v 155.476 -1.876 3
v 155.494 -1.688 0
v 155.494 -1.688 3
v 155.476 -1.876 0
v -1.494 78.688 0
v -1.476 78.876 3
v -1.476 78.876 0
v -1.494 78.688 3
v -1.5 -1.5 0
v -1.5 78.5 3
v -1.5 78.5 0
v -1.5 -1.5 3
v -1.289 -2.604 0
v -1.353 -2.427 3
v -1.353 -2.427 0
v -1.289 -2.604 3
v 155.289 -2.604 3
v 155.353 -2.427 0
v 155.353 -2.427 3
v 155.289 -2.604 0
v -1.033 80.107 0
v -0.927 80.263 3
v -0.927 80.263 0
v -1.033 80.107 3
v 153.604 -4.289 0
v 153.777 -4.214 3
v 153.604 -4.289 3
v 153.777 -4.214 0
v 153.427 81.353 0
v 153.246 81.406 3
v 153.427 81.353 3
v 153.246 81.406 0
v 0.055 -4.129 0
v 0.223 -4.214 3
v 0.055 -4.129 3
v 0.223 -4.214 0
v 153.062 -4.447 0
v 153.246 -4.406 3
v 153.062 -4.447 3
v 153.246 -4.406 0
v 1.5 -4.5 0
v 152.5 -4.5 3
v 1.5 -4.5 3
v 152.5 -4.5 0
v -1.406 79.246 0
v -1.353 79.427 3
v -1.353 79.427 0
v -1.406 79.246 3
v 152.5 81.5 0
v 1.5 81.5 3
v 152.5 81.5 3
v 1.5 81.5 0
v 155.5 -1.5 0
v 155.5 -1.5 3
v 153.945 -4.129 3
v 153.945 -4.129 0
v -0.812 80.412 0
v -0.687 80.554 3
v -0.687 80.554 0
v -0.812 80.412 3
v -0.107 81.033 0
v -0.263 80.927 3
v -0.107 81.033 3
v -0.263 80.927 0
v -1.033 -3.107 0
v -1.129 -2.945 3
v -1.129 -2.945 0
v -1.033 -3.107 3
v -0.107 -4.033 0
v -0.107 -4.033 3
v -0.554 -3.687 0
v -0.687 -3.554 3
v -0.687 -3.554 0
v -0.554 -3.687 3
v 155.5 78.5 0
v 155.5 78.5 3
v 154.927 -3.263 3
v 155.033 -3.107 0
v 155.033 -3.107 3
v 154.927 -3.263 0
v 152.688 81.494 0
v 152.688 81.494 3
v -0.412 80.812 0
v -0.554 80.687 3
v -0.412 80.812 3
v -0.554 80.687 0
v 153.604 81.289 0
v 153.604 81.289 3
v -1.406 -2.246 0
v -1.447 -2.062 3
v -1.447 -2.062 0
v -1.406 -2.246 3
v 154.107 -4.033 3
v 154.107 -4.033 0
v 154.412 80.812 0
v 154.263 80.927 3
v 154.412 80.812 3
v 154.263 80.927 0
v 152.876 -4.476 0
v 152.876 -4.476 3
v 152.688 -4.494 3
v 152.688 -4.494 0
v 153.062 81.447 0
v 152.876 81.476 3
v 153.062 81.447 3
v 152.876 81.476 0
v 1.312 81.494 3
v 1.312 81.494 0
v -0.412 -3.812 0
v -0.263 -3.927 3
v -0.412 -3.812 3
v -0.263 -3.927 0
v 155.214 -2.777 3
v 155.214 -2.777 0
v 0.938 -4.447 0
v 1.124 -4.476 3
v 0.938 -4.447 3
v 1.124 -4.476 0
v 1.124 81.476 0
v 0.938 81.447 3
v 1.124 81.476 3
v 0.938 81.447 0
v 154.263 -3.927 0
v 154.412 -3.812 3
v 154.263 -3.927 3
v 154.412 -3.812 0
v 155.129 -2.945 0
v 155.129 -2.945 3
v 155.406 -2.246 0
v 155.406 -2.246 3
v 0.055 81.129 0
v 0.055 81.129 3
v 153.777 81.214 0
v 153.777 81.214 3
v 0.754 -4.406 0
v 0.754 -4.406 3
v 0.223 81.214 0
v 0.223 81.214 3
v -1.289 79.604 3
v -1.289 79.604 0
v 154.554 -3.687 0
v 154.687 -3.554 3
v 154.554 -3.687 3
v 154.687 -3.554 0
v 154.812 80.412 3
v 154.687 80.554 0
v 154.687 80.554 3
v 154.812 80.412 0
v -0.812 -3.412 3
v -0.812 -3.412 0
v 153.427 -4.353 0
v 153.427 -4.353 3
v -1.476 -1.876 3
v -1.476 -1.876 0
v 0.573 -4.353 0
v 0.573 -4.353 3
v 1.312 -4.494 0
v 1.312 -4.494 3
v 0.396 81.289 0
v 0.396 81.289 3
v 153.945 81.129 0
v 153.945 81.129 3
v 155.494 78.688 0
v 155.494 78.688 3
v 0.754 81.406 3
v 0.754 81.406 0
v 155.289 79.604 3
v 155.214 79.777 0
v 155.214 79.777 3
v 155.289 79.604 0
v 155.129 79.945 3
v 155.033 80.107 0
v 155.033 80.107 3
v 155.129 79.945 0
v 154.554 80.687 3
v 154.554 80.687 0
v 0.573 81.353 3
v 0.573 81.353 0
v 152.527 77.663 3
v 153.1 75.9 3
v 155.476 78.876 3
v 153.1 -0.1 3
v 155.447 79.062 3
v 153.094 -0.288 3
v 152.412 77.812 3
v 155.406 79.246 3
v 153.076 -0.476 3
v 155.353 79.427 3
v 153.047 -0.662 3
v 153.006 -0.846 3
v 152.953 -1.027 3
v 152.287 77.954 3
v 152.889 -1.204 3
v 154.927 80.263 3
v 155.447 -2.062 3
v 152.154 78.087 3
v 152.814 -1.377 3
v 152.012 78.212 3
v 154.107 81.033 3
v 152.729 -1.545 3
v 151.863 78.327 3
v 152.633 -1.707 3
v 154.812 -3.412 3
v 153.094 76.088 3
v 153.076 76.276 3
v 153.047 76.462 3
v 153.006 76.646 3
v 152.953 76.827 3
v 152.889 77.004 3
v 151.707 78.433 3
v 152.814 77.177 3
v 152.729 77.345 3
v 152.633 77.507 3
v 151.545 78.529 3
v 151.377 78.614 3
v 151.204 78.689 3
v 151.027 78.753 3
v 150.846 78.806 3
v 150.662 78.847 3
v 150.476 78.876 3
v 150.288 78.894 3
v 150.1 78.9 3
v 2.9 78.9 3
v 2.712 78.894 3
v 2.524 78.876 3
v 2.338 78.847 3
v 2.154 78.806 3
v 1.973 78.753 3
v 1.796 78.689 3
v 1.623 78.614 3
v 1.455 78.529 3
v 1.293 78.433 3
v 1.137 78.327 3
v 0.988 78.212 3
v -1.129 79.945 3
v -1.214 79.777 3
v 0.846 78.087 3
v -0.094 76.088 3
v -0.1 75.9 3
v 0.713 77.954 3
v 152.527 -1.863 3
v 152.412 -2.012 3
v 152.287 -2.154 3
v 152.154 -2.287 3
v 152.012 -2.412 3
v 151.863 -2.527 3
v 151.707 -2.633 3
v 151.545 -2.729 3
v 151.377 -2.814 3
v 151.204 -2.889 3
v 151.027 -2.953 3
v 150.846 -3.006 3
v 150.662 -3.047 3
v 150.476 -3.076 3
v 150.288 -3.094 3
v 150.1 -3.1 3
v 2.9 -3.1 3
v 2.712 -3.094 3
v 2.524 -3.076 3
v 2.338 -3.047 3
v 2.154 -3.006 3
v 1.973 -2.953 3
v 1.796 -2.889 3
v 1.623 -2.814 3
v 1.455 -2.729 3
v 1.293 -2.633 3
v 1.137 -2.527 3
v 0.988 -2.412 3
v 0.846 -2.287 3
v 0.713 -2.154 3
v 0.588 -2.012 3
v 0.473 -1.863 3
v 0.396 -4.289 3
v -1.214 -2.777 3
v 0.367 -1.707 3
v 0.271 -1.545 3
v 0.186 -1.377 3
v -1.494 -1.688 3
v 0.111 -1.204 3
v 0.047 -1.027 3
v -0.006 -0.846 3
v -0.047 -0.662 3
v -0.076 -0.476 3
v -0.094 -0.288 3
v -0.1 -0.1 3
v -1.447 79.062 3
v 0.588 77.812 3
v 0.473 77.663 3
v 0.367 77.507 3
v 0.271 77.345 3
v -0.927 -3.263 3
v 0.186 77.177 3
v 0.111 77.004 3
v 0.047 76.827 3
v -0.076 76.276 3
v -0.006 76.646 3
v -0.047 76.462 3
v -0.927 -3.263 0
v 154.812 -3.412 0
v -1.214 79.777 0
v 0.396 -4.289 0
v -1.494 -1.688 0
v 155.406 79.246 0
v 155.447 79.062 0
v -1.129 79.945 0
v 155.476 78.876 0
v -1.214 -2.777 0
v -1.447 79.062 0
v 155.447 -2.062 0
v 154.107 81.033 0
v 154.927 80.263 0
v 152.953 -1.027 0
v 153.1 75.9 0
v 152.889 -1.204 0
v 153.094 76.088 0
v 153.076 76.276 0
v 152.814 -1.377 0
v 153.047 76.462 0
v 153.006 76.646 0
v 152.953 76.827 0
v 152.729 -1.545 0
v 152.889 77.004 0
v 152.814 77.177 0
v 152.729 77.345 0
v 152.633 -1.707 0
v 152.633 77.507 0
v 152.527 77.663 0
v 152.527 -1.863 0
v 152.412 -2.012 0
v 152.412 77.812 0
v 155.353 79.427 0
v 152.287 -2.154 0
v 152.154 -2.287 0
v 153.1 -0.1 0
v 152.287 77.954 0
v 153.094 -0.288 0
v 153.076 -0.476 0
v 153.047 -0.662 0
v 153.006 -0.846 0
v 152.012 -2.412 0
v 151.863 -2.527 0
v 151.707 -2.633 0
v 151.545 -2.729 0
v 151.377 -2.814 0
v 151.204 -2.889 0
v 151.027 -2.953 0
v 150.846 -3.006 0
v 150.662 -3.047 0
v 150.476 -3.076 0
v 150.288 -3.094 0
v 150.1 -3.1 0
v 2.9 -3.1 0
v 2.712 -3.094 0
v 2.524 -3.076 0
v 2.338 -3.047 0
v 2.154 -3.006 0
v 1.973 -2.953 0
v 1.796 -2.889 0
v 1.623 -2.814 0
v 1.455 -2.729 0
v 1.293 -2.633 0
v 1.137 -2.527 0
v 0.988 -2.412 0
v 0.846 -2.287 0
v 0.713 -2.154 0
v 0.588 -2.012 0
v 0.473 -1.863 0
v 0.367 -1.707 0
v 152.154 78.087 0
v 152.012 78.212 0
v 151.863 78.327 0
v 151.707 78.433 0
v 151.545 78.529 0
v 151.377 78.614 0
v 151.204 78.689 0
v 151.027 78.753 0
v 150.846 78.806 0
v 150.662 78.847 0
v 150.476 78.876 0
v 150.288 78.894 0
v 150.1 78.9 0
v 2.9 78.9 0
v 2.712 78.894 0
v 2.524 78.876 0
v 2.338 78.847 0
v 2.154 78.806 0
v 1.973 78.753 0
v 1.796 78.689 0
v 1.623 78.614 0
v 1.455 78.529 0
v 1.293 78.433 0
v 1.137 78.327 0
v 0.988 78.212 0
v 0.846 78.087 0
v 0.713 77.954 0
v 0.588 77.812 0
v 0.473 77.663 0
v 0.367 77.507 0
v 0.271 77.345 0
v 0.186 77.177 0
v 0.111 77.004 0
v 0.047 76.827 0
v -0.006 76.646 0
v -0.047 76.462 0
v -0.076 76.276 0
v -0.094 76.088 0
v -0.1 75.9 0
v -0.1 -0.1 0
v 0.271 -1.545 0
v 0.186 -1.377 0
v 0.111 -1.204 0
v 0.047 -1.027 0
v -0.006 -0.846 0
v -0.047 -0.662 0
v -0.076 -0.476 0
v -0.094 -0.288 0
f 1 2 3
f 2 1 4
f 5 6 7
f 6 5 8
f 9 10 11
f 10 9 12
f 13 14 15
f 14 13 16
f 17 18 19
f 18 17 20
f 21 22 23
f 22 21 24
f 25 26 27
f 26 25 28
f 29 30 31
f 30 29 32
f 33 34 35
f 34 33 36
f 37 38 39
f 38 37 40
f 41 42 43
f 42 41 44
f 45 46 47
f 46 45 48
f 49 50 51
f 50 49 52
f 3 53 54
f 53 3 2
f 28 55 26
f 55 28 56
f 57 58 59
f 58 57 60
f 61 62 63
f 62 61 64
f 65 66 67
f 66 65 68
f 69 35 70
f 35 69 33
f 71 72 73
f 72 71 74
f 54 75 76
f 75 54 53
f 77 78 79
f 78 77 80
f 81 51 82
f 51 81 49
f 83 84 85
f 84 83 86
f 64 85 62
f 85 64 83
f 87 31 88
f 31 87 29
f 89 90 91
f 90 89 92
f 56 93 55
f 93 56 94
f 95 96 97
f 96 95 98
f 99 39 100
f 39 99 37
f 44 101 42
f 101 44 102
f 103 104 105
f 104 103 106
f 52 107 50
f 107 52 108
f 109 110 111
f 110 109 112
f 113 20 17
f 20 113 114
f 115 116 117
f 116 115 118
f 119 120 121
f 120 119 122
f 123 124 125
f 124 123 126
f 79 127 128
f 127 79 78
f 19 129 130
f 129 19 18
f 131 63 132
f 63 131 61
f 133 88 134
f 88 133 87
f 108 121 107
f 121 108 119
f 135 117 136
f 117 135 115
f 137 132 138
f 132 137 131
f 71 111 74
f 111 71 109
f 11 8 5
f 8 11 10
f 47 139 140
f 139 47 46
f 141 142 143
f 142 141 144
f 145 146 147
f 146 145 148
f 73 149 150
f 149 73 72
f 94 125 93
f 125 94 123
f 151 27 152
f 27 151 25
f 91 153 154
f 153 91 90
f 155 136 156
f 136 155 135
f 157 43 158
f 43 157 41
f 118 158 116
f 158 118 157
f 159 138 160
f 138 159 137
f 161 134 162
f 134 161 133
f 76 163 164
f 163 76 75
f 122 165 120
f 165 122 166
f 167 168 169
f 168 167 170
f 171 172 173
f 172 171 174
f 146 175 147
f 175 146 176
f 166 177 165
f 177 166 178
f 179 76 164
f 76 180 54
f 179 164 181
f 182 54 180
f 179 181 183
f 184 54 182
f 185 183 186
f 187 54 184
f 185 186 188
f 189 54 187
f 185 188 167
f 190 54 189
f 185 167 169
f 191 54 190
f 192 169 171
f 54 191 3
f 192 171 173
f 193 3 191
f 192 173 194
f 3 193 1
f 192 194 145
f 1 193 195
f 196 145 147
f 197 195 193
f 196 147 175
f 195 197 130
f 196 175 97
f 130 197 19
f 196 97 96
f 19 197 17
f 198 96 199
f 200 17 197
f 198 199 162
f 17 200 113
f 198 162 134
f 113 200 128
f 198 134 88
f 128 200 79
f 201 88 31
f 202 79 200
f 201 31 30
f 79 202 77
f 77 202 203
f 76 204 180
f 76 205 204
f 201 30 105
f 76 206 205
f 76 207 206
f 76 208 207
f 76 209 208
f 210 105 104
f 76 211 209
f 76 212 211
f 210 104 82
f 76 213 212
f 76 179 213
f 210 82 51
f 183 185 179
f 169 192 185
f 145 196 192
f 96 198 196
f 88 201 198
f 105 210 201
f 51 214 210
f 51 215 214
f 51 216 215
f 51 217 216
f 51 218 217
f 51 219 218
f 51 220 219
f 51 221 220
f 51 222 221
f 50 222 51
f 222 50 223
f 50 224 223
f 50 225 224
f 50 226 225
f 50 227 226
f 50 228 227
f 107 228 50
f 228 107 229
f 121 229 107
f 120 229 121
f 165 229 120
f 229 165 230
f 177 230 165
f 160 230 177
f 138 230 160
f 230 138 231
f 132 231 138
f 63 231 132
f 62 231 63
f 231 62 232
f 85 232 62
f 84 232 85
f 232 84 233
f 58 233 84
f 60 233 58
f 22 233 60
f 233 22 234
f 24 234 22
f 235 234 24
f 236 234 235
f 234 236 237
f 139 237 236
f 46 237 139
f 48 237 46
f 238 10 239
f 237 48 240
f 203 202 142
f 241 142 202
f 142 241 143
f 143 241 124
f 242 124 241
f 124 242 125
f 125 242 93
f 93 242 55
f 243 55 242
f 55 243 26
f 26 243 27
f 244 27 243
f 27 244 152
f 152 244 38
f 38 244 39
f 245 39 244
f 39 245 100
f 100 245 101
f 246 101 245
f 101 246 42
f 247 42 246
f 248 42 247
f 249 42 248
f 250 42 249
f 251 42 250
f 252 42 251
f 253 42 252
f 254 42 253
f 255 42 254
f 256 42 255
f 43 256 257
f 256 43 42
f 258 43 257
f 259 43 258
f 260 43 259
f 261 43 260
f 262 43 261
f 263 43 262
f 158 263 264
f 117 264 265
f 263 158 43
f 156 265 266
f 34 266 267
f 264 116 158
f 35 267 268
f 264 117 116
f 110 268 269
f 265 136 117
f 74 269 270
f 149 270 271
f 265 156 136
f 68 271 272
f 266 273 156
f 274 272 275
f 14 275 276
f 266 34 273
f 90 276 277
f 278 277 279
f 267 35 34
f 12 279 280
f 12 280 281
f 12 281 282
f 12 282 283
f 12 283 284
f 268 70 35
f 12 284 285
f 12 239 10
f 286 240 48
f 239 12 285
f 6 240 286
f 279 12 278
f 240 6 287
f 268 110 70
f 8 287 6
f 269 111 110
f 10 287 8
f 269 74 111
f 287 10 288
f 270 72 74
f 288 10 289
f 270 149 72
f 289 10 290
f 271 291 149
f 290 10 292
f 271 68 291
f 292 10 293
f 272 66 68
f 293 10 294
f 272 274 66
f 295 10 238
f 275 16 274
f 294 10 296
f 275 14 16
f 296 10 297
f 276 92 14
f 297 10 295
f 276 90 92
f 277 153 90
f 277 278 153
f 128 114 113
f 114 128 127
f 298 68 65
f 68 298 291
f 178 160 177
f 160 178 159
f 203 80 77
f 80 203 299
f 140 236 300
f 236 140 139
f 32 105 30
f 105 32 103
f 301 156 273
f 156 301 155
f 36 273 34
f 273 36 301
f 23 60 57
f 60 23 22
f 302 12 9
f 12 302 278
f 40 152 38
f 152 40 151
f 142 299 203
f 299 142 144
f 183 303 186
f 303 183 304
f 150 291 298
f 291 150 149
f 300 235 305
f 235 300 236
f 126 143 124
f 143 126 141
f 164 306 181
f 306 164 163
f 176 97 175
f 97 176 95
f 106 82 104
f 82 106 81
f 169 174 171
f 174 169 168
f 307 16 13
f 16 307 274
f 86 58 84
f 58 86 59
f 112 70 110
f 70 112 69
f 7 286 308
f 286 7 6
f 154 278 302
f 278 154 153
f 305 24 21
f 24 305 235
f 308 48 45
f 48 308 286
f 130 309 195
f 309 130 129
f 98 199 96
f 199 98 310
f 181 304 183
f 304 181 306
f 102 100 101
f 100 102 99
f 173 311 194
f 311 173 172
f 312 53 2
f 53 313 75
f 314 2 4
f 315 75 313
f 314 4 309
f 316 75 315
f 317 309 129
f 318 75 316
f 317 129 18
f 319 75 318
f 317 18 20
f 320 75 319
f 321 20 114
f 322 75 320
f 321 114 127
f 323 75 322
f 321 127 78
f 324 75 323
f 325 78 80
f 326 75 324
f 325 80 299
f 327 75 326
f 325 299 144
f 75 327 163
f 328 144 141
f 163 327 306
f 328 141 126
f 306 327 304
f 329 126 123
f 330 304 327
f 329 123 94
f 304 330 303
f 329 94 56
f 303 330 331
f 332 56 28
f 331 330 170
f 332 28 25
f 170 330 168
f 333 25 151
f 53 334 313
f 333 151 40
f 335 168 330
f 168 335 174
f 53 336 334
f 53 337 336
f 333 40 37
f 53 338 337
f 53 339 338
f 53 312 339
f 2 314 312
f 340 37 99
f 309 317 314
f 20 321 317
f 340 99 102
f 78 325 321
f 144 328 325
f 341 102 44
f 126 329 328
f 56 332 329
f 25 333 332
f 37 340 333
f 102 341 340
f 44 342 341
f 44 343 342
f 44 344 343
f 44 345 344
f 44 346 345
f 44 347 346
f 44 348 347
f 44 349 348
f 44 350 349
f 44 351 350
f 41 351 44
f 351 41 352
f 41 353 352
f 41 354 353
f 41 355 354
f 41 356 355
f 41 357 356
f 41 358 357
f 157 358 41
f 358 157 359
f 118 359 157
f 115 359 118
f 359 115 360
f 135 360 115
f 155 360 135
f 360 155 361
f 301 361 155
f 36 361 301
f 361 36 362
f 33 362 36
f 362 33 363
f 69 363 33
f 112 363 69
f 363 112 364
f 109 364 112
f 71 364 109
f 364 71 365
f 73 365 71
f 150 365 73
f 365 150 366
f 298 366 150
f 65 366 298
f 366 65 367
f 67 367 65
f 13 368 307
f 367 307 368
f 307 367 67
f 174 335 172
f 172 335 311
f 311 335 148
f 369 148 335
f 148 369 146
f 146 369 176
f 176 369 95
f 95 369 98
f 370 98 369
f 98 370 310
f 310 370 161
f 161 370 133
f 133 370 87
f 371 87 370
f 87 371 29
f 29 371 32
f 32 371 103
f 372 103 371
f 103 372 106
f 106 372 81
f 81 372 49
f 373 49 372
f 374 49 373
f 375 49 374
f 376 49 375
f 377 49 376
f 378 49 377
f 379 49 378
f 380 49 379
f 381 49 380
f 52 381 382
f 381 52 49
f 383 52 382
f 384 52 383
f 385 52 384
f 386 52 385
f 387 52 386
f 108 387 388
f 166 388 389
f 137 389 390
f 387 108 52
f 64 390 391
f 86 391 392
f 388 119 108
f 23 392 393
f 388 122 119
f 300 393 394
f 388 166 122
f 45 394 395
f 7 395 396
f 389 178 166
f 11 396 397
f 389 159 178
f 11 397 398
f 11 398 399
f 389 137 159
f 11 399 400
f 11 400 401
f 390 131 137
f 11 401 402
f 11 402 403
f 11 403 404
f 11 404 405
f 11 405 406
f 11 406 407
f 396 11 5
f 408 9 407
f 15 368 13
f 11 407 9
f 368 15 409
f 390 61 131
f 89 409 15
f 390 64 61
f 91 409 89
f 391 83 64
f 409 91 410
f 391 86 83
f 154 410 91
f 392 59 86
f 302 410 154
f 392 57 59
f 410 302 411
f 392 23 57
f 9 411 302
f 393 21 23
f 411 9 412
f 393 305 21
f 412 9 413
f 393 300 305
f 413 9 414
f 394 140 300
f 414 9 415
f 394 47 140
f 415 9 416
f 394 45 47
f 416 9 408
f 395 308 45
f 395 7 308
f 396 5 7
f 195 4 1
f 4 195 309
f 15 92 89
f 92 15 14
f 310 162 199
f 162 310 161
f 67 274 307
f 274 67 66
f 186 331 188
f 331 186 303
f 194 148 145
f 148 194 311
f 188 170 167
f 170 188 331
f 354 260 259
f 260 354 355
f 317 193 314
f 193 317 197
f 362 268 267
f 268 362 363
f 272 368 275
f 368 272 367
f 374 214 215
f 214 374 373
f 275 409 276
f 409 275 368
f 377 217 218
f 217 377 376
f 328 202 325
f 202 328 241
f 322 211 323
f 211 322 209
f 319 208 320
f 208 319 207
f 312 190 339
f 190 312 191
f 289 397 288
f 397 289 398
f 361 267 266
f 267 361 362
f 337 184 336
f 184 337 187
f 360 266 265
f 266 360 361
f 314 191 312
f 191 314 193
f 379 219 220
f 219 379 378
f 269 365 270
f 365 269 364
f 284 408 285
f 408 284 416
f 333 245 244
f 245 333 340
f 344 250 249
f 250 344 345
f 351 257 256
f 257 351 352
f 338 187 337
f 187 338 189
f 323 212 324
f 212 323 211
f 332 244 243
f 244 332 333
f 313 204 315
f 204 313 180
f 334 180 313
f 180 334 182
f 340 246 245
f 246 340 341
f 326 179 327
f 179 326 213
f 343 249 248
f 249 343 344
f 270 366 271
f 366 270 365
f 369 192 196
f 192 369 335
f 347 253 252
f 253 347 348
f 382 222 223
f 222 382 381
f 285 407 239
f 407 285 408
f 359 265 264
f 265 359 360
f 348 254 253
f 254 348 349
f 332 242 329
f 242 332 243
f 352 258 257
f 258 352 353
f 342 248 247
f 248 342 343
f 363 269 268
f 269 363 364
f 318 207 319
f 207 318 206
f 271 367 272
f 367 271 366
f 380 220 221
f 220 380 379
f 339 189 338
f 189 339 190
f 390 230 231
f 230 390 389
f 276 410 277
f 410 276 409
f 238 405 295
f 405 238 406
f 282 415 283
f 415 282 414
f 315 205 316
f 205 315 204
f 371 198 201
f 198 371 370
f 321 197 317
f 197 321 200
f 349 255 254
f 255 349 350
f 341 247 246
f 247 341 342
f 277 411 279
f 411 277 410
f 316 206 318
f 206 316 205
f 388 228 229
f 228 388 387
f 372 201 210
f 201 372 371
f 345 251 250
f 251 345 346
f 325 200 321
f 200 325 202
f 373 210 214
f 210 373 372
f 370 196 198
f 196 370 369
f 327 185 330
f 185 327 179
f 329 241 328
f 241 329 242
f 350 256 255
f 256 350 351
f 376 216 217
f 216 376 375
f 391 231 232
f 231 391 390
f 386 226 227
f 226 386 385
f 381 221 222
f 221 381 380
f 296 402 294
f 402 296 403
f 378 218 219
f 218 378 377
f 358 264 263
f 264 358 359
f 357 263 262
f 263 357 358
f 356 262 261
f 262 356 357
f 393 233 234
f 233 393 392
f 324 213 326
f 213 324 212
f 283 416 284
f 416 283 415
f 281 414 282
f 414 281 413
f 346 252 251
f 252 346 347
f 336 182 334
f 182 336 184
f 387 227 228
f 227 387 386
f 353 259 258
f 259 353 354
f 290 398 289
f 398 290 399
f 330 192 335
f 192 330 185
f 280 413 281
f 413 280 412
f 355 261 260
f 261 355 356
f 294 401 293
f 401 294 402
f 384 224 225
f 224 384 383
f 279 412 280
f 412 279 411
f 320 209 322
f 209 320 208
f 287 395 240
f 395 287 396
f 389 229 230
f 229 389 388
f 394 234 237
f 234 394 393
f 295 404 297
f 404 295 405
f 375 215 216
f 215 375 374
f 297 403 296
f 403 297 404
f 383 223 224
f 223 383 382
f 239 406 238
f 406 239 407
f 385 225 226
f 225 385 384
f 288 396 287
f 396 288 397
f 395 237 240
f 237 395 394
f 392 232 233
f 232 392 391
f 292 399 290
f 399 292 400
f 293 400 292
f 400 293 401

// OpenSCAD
$fn=100;
//size box
boxx = 150;
boxy = 79;
boxz = 30;
boxzClose = 5;

//size for element in the box
wall = 1.5;
wall_adjusting = 1.5;
lenght_for_pcb = 5;
is = 0.1; //Przesuniecie punktu

//size for plug in the module
plug_x = 45;
plug_y = 18;
plug_z = 23;

//cut for hole in the box for plug
plug_boxx = 47 - (wall_adjusting/2);
plug_boxy = -3.1;
plug_boxz = 2.8 + lenght_for_pcb;


// mounting back case
screw_dz  =  5;        // height of the standoff
screw_dr  = 2.5;       // 5 mm diameter
screw_z = 5;  // depth of srew hole
screw_r = 1.5;       // 3 mm hole size


//BoxModule();

translate([0, 0, 31.5]){
    //Module();
//    BoxModuleClose();
}
cutClose();

module BoxModule(){
    difference(){
        minkowski(){
            cube([boxx,boxy,boxz]);
            cylinder(r=3, h=1);
        }
        // empty the inside of the box
        translate([wall,wall,wall]){
            minkowski(){
                cube([boxx-2*wall,boxy-2*wall,boxz+20]); 
                cylinder(r=3, h=1);
            }
        }
        // Cut for hole in the box
        translate([plug_boxx, plug_boxy, plug_boxz]){
            cube([plug_x + wall_adjusting, plug_y + wall_adjusting, plug_z + wall_adjusting]);
        }
    }
    translate([-1, -1, 0]){
        screwBox();
    }
    translate([151, -1, 0]){
        rotate([0, 0, 90]){
            screwBox();
        }
    }
    translate([-1, 81, 0]){
        rotate([0, 0, 270]){
            screwBox();
        }
    }
    translate([151, 81, 0]){
        rotate([0, 0, 180]){
            screwBox();
        }
    }
}

module screwBox(){
    difference(){
        translate([0,0,0]){
            minkowski(){
                cube([3,3,5]);
                cylinder(r=1, h=1);
            }
        }
        //translate([0,0,0]){
          //  cylinder(r=screw_dr,h=screw_dz+wall);
        //}
        translate([2,2,1]){ 
            cylinder(r=screw_r,h=screw_z+0.1);
        }
        
    }
}



//module
module cable(){
    color("blue");
    cube([21.5,12.6,8.5]);
    translate([21.5,2.4,0]){
        cube([11,7.5,7.4]);
        }
    }
    
module mount_USB_cable(){
    translate([0,0,0,]){
        translate([0,0,0]){
            cube([2,22,4]);
        }
        translate([2,0,0]){
            cube([30,22,2]); // Podstawka
        }   
        //mocowanie usbIn    
        translate([6+is,1.8,2-is]){
            color("green")
            cube([12,2,3]);    
        }
        translate([12+is,16.8,2-is]){
            color("green")
            cube([13,2,3]);
        }
        translate([23.7+is,14,2-is]){
            color("green")
            cube([1.8,4.8,3]);
        }    
        translate([2+is,4,2]){
            color("blue")
            cable();
        }
    }
        
}

module Module(){
    color ("red")
    cube([boxx,boxy,boxz - 28]);
    translate([47, -9, 2]){
        color ("blue")
        cube([plug_x, plug_y, plug_z]);
    }
}

module BoxModuleClose(){
   // color ("red")
    //rotate([0, 180, 0])
    difference(){
        minkowski(){
            cube([boxx,boxy,boxzClose-3]);
            cylinder(r=3, h=1);
        }
        // empty the inside of the box
        translate([wall+0.3,wall+0.3, -1]){
            minkowski(){
                cube([boxx-2.6*wall,boxy-2.6*wall,boxzClose+2]); 
                cylinder(r=3, h=1);
            }
        }
        translate([wall - 3 ,wall, - 1]){
            cutClose();
        }
    }
}

module cutClose(){
    color ("red")
    difference(){
        translate([wall,wall-3, 0]){
            minkowski(){
                cube([boxx + 1, boxy + 1, 2]); 
                cylinder(r=3, h=1);
            }
        }
        translate([wall + 1.4,wall - 1.6, -1]){
            minkowski(){
                cube([boxx - 2.8 ,boxy - 3 ,boxzClose]); 
                cylinder(r=3, h=1);
            }
        }
    }
}
